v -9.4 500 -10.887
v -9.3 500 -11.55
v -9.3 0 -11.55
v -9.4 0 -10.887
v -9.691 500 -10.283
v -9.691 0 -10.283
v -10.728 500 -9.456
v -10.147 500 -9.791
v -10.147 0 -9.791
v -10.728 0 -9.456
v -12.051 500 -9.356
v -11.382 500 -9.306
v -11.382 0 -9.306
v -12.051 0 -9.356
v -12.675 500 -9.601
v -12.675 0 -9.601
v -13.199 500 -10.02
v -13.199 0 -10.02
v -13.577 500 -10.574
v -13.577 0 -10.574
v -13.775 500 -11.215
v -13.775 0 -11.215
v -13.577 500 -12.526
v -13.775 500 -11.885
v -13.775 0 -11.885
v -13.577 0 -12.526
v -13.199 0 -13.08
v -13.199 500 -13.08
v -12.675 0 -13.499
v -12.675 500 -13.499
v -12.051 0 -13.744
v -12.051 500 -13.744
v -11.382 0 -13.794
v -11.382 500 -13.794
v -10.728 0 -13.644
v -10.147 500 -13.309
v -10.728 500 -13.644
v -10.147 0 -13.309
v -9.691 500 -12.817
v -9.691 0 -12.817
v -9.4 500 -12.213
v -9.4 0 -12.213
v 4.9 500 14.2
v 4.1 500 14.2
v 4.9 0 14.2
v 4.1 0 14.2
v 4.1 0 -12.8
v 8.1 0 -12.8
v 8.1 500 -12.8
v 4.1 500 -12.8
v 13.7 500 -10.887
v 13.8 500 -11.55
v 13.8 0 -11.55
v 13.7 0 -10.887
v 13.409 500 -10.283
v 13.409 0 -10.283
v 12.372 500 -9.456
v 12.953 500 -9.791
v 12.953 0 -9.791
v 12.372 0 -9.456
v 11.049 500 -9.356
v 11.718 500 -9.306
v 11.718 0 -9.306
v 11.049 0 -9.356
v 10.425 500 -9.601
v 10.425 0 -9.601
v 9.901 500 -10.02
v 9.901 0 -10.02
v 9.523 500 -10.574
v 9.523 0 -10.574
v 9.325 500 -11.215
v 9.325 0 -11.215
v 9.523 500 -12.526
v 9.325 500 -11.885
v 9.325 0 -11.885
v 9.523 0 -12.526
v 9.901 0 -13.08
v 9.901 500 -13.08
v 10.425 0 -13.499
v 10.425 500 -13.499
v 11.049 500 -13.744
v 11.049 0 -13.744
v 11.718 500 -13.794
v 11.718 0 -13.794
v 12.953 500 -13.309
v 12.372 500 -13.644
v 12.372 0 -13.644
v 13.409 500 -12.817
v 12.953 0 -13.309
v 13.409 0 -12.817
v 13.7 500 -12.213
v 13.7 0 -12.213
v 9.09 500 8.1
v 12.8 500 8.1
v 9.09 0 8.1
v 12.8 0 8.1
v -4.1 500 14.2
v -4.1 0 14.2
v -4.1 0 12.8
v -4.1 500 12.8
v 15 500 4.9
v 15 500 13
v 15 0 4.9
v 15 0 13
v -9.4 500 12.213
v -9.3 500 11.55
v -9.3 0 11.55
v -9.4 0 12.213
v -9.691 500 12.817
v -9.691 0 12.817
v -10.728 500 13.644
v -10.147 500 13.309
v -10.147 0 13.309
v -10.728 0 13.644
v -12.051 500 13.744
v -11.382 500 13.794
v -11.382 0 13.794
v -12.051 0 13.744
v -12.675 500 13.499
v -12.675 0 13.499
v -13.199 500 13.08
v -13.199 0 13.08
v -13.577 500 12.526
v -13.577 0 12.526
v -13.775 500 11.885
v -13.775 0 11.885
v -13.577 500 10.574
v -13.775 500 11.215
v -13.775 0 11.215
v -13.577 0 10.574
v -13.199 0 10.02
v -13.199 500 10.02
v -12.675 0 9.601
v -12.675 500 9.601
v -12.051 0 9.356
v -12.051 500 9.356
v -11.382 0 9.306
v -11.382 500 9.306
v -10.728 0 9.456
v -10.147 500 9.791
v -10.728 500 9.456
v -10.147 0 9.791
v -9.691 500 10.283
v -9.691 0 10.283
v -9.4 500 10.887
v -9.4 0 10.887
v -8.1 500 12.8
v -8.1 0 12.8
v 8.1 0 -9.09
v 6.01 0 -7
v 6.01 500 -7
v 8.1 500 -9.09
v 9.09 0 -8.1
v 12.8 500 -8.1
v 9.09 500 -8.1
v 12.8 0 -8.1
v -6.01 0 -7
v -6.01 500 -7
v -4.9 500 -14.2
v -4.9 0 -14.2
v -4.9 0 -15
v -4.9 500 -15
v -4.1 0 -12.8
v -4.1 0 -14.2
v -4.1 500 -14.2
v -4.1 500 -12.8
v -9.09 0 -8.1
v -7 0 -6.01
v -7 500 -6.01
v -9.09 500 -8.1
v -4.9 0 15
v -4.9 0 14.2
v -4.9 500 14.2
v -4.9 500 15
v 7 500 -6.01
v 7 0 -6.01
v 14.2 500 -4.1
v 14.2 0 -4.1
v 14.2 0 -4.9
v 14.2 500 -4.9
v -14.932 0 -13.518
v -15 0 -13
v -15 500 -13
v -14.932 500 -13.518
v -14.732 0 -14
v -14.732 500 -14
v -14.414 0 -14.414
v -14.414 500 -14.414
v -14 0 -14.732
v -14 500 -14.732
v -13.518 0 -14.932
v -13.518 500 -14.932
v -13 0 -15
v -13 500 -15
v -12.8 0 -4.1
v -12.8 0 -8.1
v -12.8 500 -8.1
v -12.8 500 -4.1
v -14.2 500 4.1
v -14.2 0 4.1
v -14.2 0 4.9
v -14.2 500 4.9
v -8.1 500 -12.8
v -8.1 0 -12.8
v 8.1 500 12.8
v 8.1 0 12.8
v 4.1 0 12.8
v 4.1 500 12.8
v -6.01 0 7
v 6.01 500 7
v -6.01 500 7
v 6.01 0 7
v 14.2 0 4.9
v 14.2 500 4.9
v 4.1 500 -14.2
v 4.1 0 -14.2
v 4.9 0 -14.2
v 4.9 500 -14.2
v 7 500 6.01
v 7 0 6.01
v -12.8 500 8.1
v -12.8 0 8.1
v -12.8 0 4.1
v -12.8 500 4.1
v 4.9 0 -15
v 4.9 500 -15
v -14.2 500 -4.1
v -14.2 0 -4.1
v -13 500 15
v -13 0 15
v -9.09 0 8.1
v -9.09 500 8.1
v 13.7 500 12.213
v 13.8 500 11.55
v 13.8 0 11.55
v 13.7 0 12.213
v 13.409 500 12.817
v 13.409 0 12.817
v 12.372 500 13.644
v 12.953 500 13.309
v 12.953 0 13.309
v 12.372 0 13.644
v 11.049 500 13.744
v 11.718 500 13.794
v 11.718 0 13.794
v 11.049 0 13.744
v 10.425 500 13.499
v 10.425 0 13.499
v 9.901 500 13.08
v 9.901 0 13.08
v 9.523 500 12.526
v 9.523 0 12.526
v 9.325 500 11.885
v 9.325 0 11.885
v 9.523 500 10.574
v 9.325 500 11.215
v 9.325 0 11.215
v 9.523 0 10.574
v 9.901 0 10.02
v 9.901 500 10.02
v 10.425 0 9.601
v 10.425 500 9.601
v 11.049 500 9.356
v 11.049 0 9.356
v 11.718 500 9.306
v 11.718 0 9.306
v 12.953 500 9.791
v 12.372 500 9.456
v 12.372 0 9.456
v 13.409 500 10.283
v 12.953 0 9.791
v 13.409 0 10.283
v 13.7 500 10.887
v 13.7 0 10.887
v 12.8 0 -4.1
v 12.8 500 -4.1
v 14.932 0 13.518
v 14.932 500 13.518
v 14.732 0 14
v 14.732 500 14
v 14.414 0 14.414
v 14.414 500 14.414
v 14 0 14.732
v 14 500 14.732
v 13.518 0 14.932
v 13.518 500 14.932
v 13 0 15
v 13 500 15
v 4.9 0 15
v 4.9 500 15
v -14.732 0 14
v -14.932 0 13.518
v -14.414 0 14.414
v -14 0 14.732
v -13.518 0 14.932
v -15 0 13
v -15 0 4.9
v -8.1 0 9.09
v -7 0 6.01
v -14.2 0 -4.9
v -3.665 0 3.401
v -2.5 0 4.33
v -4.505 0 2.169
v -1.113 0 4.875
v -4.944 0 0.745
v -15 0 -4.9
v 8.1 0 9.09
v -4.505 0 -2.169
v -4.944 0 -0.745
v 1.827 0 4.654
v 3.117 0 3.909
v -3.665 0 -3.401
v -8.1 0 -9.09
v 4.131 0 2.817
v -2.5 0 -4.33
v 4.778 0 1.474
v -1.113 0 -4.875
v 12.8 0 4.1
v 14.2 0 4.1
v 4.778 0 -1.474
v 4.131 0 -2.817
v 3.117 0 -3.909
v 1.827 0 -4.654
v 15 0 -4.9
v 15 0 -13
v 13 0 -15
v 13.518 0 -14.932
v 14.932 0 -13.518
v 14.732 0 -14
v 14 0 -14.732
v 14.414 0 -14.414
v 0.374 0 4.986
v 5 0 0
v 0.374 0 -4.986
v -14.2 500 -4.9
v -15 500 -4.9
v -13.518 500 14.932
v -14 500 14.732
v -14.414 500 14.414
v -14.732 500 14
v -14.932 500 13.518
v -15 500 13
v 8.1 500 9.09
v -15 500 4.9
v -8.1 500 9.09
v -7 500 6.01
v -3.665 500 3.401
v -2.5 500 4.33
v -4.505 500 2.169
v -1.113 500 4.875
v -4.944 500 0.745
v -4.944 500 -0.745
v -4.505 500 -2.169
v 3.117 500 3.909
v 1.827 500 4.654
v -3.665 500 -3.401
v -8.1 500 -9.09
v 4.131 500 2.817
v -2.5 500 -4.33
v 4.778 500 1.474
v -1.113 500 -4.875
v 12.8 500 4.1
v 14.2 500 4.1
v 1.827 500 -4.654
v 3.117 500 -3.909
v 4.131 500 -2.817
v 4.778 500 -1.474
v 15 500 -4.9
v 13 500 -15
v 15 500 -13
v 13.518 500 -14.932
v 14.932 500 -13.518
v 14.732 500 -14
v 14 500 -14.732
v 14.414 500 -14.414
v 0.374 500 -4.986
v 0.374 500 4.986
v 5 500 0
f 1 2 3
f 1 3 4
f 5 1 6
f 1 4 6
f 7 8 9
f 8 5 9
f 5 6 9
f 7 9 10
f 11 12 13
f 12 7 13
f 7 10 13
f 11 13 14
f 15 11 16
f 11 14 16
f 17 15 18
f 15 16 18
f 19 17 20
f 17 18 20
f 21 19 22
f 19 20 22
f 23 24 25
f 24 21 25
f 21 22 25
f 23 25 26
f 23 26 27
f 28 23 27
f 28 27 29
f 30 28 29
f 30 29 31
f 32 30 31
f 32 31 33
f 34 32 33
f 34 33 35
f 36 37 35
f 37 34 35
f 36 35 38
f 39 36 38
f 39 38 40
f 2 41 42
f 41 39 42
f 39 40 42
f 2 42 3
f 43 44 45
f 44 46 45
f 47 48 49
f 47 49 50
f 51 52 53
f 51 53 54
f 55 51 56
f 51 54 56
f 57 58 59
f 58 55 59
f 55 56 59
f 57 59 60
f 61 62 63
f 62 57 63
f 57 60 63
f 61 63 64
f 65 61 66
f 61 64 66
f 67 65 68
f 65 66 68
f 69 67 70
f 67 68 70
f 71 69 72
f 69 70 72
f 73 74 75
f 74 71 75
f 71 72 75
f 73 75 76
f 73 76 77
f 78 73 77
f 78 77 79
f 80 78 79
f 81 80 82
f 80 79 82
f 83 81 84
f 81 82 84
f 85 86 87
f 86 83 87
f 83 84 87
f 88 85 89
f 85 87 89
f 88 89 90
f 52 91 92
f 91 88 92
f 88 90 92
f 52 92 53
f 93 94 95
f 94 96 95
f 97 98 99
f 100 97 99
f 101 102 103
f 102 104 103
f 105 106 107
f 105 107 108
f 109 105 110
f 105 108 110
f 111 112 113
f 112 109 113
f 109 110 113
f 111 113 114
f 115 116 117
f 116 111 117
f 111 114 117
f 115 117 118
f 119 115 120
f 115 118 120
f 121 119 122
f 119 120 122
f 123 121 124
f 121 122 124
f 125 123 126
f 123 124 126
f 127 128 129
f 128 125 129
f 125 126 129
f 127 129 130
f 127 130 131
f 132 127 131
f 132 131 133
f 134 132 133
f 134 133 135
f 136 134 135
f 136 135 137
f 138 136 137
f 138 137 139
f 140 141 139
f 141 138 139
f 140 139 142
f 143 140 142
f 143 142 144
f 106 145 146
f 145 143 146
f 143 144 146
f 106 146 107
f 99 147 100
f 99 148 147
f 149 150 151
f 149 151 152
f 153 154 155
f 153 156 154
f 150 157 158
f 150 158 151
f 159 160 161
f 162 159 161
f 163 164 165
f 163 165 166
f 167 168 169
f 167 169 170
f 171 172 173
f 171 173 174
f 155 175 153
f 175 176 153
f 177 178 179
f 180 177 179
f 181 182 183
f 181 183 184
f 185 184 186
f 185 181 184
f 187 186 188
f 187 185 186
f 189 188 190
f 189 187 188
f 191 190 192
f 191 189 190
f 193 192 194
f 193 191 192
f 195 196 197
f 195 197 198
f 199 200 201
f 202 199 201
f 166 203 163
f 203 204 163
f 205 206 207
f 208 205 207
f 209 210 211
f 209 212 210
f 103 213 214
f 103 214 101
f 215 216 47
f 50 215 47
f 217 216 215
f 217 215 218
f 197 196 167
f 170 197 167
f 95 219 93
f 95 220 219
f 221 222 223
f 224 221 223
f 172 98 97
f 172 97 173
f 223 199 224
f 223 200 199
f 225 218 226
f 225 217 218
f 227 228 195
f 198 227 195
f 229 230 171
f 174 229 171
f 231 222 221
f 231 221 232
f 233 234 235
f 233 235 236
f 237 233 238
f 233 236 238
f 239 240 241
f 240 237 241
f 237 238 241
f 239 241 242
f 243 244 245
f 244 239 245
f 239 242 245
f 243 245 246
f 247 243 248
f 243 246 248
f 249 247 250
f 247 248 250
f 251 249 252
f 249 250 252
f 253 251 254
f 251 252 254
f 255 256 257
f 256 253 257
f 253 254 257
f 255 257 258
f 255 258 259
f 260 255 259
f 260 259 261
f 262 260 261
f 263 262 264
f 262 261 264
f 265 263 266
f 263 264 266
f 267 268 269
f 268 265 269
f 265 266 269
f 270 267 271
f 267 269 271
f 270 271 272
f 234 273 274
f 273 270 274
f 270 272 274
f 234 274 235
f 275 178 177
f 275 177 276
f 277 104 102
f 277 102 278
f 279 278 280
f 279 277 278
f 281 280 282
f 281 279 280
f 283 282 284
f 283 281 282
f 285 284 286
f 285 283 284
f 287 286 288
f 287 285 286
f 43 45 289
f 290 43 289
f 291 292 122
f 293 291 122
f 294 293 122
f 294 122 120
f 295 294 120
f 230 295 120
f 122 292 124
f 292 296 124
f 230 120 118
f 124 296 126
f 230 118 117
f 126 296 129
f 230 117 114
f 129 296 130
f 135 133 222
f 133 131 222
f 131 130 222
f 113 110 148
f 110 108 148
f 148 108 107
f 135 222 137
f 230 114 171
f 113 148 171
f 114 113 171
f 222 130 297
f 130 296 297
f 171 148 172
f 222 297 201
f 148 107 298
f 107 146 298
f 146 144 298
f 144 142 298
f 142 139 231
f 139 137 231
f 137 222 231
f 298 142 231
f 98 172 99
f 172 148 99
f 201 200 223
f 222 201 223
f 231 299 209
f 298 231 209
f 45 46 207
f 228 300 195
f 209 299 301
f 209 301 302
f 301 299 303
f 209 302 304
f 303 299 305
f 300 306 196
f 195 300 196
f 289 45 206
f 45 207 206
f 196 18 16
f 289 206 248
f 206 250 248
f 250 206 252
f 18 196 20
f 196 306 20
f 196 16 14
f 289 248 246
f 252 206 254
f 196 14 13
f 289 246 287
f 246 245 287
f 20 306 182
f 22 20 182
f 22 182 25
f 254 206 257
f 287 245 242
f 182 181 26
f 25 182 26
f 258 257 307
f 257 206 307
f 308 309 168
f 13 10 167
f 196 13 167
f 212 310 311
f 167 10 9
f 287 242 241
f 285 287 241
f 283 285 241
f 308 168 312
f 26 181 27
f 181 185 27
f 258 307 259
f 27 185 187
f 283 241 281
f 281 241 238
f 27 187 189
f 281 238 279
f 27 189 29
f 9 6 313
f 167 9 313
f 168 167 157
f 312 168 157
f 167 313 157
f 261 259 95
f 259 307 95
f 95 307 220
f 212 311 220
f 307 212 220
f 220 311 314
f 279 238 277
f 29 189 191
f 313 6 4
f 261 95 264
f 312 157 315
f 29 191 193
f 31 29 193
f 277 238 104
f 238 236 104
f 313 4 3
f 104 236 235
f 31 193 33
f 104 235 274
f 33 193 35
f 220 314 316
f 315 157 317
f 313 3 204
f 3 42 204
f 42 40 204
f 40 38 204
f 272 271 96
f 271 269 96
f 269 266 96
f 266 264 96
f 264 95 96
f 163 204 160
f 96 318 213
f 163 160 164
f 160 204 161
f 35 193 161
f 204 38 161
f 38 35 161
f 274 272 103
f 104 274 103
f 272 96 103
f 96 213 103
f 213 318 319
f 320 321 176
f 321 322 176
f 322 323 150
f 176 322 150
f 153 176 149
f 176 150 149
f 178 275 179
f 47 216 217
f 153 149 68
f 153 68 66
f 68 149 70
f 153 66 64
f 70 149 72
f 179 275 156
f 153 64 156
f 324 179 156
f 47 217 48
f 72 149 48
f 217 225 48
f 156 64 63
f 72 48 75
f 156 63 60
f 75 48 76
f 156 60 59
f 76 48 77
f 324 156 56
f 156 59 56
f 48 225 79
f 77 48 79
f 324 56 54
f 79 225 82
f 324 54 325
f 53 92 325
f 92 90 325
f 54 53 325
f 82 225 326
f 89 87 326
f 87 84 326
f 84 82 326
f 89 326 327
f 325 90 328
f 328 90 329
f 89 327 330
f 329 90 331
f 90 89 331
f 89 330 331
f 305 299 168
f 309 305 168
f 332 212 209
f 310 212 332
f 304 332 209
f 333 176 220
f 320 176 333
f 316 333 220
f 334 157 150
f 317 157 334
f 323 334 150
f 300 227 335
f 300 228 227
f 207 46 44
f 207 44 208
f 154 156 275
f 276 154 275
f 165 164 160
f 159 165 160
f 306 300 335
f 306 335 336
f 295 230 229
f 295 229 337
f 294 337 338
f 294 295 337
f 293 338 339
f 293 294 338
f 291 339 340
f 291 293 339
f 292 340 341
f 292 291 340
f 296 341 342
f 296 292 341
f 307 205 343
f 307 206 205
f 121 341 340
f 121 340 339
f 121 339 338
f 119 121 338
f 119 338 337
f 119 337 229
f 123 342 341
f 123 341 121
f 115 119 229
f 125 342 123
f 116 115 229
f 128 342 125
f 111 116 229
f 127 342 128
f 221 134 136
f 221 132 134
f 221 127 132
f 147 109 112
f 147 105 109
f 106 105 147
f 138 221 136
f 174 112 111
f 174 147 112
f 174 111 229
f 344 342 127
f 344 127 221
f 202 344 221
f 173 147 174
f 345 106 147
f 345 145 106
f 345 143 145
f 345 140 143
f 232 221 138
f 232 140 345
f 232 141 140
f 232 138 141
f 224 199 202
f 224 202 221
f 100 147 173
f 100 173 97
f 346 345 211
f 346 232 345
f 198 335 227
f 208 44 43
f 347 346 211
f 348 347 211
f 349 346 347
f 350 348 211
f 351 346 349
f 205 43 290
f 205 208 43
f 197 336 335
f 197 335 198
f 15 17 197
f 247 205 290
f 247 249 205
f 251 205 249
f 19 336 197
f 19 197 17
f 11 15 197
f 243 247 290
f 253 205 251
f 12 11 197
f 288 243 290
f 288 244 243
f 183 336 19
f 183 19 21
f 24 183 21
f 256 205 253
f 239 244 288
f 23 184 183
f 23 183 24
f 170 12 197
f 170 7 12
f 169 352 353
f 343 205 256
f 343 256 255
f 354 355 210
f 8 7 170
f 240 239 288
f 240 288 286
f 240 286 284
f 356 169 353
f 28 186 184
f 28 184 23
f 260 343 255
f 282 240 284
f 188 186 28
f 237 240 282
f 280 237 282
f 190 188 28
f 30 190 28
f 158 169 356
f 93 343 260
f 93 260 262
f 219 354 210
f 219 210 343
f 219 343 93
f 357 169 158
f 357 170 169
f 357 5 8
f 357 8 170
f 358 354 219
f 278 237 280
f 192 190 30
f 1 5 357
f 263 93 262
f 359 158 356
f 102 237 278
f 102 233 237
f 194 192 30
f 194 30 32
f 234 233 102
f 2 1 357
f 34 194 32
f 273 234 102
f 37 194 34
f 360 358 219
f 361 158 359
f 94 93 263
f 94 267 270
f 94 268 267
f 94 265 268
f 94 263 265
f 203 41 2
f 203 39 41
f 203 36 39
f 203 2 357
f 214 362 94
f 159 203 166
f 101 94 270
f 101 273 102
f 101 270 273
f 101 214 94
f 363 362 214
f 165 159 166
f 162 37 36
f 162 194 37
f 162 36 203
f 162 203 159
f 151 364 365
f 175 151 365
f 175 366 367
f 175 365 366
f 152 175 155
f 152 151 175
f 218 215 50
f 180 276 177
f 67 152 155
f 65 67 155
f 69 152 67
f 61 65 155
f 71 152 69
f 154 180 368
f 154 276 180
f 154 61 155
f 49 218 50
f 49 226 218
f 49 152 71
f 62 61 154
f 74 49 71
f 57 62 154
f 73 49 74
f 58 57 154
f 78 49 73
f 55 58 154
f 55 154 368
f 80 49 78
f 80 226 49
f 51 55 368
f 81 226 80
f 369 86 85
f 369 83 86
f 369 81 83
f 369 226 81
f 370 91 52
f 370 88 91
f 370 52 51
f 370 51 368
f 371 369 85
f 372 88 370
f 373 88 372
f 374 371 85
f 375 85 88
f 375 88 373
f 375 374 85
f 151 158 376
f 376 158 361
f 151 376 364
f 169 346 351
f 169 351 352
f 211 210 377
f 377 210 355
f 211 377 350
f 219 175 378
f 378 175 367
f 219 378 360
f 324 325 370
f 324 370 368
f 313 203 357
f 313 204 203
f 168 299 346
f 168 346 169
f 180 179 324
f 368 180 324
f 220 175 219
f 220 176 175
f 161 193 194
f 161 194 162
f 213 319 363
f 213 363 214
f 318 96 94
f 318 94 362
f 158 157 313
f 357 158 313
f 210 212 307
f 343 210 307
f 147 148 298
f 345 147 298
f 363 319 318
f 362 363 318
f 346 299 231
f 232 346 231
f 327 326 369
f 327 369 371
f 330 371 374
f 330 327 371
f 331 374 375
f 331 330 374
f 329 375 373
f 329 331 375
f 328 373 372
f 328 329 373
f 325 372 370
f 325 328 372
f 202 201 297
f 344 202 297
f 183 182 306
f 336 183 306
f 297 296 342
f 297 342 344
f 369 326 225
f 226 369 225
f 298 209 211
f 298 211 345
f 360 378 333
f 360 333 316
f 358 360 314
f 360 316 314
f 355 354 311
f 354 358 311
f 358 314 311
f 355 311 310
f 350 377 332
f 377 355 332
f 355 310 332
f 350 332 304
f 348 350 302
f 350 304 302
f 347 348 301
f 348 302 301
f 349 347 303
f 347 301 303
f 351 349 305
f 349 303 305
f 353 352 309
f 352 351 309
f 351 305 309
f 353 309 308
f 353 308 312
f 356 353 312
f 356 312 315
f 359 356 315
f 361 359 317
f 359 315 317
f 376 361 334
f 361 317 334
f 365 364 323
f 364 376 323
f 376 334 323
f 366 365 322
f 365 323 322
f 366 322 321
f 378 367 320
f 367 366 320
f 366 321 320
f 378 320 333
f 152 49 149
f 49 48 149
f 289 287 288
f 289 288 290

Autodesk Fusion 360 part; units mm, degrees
sketch "Sketch1" plane through (0, 0, 0) normal (0, 1, 0) x (1, 0, 0)
  line L0 (6.0101, -7) -> (-6.0101, -7)
  line L1 (-8.1, -12.8) -> (-8.1, -9.0899)
  line L2 (-6.0101, -7) -> (-8.1, -9.0899)
  line L3 (-4.1, -14.2) -> (-4.9, -14.2)
  line L4 (-4.9, -14.2) -> (-4.9, -15)
  line L5 (-4.1, -14.2) -> (-4.1, -12.8)
  line L6 (-13, -15) -> (-4.9, -15)
  line L7 (-8.1, -12.8) -> (-4.1, -12.8)
  line L8 (6.0101, -7) -> (8.1, -9.0899)
  line L9 (8.1, -12.8) -> (8.1, -9.0899)
  line L10 (8.1, -12.8) -> (4.1, -12.8)
  line L11 (4.1, -14.2) -> (4.1, -12.8)
  line L12 (4.1, -14.2) -> (4.9, -14.2)
  line L13 (4.9, -14.2) -> (4.9, -15)
  line L14 (13, -15) -> (4.9, -15)
  line L15 (14.2, -4.1) -> (14.2, -4.9)
  line L16 (12.8, -8.1) -> (9.0899, -8.1)
  line L17 (15, -13) -> (15, -4.9)
  line L18 (7, 6.0101) -> (9.0899, 8.1)
  line L19 (7, 6.0101) -> (7, -6.0101)
  line L20 (14.2, 4.9) -> (15, 4.9)
  line L21 (7, -6.0101) -> (9.0899, -8.1)
  line L22 (14.2, -4.1) -> (12.8, -4.1)
  line L23 (14.2, 4.1) -> (12.8, 4.1)
  line L24 (15, 13) -> (15, 4.9)
  line L25 (14.2, -4.9) -> (15, -4.9)
  line L26 (12.8, 8.1) -> (9.0899, 8.1)
  line L27 (12.8, 8.1) -> (12.8, 4.1)
  line L28 (12.8, -8.1) -> (12.8, -4.1)
  line L29 (14.2, 4.1) -> (14.2, 4.9)
  line L30 (4.1, 14.2) -> (4.9, 14.2)
  line L31 (8.1, 12.8) -> (8.1, 9.0899)
  line L32 (13, 15) -> (4.9, 15)
  line L33 (-6.0101, 7) -> (-8.1, 9.0899)
  line L34 (-6.0101, 7) -> (6.0101, 7)
  line L35 (-4.9, 14.2) -> (-4.9, 15)
  line L36 (6.0101, 7) -> (8.1, 9.0899)
  line L37 (4.1, 14.2) -> (4.1, 12.8)
  line L38 (-4.1, 14.2) -> (-4.1, 12.8)
  line L39 (-13, 15) -> (-4.9, 15)
  line L40 (4.9, 14.2) -> (4.9, 15)
  line L41 (-8.1, 12.8) -> (-8.1, 9.0899)
  line L42 (-8.1, 12.8) -> (-4.1, 12.8)
  line L43 (8.1, 12.8) -> (4.1, 12.8)
  line L44 (-4.1, 14.2) -> (-4.9, 14.2)
  line L45 (-14.2, 4.1) -> (-14.2, 4.9)
  line L46 (-12.8, 8.1) -> (-9.0899, 8.1)
  line L47 (-15, 13) -> (-15, 4.9)
  line L48 (-7, -6.0101) -> (-9.0899, -8.1)
  line L49 (-7, -6.0101) -> (-7, 6.0101)
  line L50 (-14.2, -4.9) -> (-15, -4.9)
  line L51 (-7, 6.0101) -> (-9.0899, 8.1)
  line L52 (-14.2, 4.1) -> (-12.8, 4.1)
  line L53 (-14.2, -4.1) -> (-12.8, -4.1)
  line L54 (-15, -13) -> (-15, -4.9)
  line L55 (-14.2, 4.9) -> (-15, 4.9)
  line L56 (-12.8, -8.1) -> (-9.0899, -8.1)
  line L57 (-12.8, -8.1) -> (-12.8, -4.1)
  line L58 (-12.8, 8.1) -> (-12.8, 4.1)
  line L59 (-14.2, -4.1) -> (-14.2, -4.9)
  circle A0 centre (0, 0) radius 5
  circle A1 centre (-11.55, -11.55) radius 2.25
  circle A2 centre (11.55, -11.55) radius 2.25
  circle A3 centre (11.55, 11.55) radius 2.25
  circle A4 centre (-11.55, 11.55) radius 2.25
  arc A5 (-15, -13) -> (-13, -15) centre (-13, -13) ccw
  arc A6 (13, -15) -> (15, -13) centre (13, -13) ccw
  arc A7 (15, 13) -> (13, 15) centre (13, 13) ccw
  arc A8 (-13, 15) -> (-15, 13) centre (-13, 13) ccw
  dimension "d17" = 10
  dimension "d22" = 4.5
  dimension "d24" = 360
  dimension "d25" = 2
extrude "Extrude1" add sketch "Sketch1" along normal blind 500
